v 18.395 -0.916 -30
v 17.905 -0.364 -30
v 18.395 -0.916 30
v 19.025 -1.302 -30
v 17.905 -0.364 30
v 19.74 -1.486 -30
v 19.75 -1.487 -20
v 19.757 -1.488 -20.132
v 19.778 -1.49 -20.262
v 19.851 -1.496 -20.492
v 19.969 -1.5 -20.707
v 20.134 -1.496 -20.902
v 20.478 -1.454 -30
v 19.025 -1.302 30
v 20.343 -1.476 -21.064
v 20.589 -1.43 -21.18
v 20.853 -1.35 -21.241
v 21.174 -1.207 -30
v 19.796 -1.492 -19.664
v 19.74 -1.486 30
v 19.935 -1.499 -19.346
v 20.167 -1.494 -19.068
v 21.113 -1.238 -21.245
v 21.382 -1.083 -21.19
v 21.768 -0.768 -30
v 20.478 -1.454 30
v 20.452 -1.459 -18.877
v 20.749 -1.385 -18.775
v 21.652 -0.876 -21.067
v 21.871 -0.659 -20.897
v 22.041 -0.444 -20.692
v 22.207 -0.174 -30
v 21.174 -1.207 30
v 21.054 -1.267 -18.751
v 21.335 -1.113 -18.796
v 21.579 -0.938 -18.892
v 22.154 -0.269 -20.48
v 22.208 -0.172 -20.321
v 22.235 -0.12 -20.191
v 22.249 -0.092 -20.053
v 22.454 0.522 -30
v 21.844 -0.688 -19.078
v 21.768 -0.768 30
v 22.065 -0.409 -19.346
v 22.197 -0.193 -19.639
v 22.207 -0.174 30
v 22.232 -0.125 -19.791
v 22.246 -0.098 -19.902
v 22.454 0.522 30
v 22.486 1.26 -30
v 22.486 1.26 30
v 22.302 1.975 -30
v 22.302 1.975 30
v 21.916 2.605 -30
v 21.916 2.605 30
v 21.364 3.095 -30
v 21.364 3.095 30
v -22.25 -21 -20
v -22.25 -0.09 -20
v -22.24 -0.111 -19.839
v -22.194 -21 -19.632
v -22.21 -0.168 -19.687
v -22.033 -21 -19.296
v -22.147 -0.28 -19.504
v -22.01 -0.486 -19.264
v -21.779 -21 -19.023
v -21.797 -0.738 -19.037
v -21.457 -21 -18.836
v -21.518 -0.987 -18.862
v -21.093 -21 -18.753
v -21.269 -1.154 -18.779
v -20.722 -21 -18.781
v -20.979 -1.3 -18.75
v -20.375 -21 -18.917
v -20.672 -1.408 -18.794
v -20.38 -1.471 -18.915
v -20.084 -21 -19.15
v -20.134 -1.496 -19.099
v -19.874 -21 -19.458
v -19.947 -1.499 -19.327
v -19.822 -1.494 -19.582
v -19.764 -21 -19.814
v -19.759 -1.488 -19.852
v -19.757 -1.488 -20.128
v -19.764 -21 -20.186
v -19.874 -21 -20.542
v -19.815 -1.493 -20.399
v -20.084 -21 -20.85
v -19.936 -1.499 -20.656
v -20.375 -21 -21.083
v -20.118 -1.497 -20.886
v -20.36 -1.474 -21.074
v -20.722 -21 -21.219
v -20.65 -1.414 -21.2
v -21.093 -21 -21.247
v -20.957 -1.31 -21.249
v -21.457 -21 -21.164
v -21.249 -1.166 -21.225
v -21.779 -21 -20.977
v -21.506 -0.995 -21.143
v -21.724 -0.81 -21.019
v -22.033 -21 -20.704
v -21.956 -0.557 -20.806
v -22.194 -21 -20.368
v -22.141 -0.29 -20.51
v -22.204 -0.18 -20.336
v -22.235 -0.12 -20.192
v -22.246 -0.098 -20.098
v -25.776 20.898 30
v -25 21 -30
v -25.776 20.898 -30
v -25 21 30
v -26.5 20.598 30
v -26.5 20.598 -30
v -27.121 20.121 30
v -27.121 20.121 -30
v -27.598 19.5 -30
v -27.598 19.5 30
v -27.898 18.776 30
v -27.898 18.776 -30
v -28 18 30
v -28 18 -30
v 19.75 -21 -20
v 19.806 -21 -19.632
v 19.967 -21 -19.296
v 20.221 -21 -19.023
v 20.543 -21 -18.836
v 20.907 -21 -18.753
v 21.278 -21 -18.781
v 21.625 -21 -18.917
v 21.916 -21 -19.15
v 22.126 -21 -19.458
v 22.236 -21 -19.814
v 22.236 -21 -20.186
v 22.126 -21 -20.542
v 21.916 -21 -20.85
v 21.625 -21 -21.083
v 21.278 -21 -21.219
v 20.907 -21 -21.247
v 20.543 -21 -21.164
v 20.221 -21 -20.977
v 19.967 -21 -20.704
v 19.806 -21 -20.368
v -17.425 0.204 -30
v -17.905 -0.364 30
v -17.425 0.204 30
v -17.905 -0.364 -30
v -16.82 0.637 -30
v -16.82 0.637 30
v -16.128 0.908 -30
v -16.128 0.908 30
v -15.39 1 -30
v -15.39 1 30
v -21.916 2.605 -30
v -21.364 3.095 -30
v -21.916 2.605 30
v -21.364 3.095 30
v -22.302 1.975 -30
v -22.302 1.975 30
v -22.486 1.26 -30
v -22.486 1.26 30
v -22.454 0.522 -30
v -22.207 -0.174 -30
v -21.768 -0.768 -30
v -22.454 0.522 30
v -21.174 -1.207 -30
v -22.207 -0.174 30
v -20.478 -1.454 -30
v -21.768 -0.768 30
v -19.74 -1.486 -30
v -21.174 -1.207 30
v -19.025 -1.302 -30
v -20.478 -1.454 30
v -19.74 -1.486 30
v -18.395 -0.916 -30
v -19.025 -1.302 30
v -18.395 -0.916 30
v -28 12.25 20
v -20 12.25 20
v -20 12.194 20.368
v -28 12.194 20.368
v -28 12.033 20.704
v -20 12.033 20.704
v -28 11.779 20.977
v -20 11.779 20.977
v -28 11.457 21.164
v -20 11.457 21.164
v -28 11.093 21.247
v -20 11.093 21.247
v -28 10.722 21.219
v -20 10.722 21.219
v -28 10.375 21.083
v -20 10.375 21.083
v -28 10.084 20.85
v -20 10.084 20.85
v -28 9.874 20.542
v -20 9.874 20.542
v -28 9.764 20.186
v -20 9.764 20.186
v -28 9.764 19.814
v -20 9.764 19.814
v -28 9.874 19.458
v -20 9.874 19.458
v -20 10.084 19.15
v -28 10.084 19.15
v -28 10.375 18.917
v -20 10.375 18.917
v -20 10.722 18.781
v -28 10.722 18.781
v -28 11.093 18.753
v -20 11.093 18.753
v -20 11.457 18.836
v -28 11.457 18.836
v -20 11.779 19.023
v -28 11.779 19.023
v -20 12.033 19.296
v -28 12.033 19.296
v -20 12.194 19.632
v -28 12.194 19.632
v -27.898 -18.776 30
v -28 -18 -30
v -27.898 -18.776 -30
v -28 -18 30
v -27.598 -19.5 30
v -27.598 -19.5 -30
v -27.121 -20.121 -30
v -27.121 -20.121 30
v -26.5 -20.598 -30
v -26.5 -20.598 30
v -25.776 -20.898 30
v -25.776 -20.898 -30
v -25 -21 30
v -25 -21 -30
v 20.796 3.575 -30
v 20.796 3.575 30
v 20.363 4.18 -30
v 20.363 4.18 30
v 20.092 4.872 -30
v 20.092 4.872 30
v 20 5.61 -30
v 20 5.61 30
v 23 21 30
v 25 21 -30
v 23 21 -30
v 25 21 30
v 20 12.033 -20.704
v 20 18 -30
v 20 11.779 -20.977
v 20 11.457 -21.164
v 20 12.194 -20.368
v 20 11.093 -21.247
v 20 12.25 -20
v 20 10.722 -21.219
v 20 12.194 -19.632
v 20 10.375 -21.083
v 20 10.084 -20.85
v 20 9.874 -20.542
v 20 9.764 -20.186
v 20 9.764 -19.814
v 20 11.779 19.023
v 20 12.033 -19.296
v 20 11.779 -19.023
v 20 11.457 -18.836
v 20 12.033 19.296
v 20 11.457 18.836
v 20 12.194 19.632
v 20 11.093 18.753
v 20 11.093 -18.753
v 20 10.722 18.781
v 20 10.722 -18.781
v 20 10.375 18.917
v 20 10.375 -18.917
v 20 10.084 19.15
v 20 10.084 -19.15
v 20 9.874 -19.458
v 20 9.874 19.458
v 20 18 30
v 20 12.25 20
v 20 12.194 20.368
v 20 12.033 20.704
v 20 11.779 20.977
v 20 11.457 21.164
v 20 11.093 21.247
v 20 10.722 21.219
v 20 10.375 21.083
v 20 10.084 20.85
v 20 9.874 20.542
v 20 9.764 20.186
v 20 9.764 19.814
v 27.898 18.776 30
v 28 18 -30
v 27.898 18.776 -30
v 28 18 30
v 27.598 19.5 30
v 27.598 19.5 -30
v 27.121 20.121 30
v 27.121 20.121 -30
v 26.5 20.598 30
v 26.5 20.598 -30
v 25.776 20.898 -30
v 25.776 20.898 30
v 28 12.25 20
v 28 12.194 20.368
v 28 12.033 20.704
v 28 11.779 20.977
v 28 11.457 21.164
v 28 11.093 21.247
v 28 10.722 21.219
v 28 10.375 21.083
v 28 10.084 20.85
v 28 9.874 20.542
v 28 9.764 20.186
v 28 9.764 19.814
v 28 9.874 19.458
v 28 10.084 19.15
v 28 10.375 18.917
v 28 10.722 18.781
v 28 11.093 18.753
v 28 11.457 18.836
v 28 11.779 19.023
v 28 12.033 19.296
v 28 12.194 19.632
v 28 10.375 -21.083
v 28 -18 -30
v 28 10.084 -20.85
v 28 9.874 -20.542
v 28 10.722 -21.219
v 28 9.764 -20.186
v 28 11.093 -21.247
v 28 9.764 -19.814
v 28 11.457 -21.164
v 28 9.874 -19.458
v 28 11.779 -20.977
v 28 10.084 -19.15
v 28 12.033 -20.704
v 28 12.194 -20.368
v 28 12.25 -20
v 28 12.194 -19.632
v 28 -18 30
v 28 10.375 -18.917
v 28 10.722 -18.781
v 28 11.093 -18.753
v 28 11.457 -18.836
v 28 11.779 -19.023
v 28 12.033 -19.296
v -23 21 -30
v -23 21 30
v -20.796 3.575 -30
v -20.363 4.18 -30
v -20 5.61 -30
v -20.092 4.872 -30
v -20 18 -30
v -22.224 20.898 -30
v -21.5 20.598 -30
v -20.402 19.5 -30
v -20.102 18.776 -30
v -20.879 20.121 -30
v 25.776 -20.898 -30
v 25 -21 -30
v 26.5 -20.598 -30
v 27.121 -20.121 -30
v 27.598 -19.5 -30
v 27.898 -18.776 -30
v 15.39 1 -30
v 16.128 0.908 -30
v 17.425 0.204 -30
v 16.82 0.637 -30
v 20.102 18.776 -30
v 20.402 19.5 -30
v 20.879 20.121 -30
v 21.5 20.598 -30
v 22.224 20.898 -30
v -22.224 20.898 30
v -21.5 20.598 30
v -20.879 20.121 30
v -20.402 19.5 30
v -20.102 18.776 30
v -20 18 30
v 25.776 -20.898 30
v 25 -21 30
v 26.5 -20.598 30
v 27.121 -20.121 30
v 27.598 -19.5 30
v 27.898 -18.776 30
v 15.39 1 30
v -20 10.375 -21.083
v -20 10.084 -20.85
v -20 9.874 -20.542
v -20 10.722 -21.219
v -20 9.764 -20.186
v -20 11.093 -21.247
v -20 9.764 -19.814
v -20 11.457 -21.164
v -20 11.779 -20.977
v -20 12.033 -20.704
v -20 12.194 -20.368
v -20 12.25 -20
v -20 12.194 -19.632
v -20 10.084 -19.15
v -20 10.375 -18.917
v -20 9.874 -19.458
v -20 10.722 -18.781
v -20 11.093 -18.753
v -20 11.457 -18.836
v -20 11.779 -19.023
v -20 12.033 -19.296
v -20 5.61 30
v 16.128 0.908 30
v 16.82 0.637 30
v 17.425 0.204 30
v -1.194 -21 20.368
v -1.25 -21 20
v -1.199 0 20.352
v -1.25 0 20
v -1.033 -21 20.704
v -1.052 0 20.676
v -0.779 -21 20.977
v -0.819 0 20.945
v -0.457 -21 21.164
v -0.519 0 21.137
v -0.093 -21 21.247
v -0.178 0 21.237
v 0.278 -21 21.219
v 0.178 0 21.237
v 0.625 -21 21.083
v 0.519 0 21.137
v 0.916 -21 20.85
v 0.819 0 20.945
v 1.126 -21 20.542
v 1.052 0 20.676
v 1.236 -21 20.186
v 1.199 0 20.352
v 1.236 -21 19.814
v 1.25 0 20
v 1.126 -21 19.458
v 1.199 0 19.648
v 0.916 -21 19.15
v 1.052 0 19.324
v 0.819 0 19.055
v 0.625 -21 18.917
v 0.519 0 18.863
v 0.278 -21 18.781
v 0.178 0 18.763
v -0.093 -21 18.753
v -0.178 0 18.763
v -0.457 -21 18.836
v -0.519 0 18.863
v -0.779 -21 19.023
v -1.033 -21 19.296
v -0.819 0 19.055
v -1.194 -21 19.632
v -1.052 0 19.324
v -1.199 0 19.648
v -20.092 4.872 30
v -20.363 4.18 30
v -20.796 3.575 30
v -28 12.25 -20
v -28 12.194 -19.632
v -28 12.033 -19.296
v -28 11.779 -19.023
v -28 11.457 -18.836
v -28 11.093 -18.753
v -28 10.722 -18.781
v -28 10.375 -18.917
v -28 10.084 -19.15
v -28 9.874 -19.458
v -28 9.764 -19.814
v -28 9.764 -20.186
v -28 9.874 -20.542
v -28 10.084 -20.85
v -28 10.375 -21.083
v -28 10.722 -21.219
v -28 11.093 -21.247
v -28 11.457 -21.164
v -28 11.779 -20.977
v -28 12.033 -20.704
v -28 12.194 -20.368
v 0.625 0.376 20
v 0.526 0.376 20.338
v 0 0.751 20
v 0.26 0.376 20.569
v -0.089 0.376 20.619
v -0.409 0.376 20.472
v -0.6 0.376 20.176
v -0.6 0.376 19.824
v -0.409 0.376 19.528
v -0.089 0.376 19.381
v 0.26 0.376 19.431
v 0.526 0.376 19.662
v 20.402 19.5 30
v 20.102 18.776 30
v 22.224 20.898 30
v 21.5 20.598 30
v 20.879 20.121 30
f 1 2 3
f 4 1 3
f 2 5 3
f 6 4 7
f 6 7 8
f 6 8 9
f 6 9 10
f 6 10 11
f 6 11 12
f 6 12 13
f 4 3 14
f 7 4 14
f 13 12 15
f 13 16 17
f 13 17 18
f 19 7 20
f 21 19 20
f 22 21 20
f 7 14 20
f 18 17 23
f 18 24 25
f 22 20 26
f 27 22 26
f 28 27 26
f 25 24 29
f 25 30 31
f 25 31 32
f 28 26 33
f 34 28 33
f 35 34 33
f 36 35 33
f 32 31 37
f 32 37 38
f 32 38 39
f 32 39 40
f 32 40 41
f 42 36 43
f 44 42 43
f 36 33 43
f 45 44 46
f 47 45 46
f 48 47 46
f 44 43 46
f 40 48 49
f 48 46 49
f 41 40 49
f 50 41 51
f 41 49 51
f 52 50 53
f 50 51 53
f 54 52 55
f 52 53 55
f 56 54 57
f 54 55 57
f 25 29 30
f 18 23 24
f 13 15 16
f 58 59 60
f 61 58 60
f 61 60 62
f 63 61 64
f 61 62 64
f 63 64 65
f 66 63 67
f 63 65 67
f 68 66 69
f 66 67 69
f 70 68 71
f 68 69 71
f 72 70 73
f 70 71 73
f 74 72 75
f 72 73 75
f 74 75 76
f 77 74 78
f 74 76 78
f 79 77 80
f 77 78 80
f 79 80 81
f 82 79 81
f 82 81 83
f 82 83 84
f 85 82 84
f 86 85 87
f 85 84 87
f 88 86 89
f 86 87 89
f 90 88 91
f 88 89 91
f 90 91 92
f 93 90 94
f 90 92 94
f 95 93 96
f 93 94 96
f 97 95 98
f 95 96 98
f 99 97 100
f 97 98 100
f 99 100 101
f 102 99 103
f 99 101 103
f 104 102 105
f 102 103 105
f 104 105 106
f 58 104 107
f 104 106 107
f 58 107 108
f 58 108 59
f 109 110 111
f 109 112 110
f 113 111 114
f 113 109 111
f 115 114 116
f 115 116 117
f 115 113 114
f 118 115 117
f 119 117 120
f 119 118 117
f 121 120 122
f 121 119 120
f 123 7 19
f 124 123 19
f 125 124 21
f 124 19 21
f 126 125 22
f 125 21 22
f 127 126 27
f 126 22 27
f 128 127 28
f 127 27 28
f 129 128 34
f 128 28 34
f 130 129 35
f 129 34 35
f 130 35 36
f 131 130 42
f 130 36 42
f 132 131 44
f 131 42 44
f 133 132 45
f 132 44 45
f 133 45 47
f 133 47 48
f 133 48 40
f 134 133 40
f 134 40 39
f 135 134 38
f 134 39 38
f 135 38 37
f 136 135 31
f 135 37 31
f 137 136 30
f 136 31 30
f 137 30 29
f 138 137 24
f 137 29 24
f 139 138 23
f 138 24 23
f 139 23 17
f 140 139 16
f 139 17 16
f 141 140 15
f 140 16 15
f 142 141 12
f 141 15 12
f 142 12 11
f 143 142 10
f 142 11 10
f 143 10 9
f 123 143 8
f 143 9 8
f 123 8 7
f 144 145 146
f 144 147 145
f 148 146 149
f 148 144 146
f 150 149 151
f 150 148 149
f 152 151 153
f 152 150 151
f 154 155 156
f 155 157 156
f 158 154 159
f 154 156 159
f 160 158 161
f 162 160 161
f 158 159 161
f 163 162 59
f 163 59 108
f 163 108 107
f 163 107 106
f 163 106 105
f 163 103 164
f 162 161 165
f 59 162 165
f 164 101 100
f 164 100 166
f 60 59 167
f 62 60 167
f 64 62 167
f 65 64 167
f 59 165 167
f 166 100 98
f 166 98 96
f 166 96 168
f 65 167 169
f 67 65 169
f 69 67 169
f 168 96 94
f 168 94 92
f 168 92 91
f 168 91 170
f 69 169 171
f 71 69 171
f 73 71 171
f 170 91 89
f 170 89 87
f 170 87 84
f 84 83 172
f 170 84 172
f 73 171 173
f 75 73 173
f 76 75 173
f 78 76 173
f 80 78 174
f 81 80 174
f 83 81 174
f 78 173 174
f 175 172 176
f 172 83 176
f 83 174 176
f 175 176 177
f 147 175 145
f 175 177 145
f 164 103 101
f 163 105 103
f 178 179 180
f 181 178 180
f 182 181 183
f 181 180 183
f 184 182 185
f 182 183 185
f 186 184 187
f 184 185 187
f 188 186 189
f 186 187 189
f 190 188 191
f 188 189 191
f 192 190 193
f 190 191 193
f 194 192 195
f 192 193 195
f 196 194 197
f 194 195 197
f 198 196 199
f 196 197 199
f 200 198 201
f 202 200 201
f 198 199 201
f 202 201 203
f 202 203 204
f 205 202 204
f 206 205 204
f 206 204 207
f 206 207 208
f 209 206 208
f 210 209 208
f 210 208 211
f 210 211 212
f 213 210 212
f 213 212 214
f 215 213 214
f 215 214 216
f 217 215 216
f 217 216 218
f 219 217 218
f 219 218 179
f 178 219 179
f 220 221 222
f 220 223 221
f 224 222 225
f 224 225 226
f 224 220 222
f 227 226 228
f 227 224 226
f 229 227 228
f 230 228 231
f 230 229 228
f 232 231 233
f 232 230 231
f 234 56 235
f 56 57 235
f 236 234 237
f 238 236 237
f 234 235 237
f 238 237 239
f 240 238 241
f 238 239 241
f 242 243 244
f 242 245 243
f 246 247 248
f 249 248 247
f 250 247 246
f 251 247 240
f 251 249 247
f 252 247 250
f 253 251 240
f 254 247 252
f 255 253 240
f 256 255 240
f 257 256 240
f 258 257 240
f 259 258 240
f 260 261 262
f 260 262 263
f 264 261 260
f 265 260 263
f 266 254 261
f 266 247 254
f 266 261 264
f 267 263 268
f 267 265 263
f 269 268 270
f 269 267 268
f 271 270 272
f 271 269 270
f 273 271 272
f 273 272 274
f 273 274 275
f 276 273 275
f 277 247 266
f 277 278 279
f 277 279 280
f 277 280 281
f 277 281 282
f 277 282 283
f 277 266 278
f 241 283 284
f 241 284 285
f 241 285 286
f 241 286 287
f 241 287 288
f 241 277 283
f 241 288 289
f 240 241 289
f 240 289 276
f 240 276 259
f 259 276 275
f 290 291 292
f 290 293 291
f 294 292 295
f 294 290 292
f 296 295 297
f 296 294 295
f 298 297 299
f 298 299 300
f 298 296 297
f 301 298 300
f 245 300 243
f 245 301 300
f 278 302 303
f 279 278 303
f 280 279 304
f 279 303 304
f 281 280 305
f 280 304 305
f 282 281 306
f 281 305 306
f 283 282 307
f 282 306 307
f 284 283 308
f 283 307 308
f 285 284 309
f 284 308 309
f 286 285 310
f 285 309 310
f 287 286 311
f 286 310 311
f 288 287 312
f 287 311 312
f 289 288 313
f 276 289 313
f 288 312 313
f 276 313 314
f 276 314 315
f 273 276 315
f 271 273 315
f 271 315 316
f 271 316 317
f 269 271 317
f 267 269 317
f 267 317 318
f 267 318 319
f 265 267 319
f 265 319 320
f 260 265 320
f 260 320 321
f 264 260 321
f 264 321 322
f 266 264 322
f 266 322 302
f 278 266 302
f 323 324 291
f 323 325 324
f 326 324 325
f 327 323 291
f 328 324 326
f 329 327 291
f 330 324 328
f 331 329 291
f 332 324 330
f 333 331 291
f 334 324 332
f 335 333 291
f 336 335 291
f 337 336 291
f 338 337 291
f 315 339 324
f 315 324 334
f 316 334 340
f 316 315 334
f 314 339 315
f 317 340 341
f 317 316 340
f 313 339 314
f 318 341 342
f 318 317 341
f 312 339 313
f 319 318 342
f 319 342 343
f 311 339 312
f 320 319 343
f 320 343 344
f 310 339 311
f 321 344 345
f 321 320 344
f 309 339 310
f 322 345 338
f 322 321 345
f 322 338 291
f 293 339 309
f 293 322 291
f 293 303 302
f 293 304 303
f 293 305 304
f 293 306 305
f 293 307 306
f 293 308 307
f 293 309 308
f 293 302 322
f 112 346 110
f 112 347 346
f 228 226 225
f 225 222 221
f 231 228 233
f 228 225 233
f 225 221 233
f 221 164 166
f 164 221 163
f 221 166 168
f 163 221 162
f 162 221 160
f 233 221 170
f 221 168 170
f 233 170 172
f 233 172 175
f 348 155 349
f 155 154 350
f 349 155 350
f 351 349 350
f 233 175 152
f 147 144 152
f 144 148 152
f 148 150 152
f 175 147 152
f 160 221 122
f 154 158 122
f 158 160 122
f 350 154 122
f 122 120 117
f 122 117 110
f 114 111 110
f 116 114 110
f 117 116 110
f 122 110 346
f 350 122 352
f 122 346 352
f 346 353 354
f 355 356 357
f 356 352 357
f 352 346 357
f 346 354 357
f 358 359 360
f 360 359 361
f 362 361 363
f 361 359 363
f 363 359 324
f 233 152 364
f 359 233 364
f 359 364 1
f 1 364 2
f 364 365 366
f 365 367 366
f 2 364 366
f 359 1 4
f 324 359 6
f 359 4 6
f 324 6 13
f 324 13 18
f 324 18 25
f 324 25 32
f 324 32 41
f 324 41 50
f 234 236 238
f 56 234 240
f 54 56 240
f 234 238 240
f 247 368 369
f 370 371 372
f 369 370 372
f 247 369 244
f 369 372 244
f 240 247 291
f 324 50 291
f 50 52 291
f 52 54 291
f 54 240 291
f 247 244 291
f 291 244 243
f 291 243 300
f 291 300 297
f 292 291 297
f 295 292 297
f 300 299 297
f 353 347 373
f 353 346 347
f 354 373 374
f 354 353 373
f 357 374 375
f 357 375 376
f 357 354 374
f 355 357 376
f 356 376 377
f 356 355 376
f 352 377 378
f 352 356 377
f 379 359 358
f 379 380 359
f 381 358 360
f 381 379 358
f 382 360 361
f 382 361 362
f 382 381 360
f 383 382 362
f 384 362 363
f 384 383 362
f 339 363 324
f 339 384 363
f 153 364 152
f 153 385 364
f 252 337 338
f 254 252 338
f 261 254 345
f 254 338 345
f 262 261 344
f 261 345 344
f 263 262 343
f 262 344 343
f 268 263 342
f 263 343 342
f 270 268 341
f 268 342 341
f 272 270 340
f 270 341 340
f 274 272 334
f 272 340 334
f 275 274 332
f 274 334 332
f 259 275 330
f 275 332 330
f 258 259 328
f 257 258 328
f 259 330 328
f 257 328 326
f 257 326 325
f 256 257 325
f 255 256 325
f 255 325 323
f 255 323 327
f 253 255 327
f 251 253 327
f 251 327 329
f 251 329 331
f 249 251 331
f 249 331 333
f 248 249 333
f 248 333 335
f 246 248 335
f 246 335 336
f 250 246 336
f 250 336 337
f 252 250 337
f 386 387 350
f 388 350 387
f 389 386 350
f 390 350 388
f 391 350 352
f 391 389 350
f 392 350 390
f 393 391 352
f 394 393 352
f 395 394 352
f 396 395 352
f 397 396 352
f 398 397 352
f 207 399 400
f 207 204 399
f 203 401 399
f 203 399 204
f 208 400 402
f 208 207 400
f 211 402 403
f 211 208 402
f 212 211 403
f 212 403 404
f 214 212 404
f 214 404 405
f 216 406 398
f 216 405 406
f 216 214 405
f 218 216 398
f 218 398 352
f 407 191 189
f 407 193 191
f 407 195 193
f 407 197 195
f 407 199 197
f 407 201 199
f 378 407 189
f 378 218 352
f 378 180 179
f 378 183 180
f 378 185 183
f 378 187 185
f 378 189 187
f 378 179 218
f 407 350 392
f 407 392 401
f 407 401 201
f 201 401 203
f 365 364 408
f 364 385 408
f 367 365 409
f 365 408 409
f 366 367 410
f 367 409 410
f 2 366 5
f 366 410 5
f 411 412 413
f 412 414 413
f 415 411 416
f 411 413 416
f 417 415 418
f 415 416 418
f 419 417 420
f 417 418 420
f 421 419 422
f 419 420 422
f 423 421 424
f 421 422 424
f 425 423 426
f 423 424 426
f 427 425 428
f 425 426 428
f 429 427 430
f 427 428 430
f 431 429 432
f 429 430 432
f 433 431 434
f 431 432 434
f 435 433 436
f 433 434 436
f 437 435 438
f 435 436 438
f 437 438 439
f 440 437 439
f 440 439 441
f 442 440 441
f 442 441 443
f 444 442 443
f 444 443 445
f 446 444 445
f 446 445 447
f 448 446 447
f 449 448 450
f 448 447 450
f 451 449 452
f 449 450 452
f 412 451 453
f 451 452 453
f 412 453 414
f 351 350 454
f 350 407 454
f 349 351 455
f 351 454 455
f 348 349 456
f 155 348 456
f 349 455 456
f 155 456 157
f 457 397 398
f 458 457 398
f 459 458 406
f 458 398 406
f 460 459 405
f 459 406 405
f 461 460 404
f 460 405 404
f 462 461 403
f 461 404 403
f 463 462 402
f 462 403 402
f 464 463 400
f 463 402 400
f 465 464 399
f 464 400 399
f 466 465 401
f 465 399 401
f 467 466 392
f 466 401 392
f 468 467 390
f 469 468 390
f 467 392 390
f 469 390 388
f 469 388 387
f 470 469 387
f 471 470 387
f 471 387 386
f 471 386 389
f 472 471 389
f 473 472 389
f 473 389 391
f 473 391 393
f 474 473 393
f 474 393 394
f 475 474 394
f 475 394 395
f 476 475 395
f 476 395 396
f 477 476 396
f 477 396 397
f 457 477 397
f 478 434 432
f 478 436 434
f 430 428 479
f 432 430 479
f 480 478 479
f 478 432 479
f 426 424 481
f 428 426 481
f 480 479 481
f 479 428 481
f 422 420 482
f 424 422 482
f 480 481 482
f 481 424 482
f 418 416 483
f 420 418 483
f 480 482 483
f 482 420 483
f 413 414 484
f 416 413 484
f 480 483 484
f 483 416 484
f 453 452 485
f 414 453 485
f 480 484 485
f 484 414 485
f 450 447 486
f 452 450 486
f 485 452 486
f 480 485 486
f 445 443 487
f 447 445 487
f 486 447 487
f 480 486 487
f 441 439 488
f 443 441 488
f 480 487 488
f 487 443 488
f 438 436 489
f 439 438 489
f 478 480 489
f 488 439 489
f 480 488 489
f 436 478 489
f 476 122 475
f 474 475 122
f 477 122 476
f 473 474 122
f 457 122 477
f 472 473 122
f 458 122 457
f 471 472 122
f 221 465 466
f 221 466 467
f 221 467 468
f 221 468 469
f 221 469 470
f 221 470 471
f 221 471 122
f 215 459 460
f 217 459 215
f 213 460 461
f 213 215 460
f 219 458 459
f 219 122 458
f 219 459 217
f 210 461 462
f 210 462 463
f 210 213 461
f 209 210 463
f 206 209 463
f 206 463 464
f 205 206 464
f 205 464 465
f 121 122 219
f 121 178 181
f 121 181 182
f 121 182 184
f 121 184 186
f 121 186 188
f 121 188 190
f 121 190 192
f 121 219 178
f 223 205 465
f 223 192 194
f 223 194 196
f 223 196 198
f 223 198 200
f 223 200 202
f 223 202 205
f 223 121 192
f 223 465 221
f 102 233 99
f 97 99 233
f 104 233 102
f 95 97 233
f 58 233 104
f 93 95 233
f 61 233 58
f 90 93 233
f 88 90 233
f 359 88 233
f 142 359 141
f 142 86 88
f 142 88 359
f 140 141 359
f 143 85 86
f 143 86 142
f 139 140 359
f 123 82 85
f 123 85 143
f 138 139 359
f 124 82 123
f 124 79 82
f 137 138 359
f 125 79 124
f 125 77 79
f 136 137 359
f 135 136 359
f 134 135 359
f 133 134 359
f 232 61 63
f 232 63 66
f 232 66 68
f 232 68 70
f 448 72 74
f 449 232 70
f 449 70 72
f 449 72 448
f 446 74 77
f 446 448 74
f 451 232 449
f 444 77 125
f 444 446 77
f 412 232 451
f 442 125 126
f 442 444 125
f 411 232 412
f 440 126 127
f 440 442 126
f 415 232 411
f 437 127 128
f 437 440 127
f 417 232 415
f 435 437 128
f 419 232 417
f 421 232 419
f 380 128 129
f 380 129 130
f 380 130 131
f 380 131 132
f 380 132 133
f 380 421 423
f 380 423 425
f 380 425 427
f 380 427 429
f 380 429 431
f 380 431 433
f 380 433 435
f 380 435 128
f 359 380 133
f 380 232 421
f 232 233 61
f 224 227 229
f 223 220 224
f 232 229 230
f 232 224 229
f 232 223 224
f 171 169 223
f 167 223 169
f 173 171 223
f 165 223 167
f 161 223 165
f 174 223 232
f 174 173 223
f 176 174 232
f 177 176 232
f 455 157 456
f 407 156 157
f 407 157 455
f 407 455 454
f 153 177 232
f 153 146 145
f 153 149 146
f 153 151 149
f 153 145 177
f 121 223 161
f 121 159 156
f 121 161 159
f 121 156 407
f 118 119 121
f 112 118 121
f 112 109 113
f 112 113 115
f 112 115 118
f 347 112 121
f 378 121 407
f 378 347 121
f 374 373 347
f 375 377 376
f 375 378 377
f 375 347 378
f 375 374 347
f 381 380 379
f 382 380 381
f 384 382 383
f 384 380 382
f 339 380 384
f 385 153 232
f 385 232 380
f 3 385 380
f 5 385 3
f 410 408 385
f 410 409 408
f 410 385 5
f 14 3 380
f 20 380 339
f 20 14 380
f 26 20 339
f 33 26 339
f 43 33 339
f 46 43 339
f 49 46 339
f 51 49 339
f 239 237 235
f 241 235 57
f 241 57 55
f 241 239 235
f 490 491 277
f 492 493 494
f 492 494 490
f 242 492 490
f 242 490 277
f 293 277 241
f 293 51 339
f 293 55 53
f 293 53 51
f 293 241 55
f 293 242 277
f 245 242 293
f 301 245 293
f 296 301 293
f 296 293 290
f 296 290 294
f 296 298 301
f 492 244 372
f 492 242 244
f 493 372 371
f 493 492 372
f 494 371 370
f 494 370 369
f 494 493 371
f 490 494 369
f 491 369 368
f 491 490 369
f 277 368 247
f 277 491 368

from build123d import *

# Parameters (mm, degrees)
F1_DEPTH = 30
F3_D     = 2.5
F5_D     = 2.5
F5_DEPTH = 21
F5_TIP   = 0.7510757738
F6_R     = 3
F7_R     = 2.5
F8_DEPTH = 60.001
F9_R     = 3


with BuildPart() as f1:
    # F0 (on Top) → F1 (new body, symmetric)
    with BuildSketch(Plane.XY):
        Polygon((-20, 21), (-28, 21), (-28, -21), (28, -21), (28, 21), (20, 21), (20, 1), (-20, 1), align=None)
    extrude(amount=F1_DEPTH, both=True)

    # F3 (through all)
    with Locations(Plane(origin=(-28, 0, 0), x_dir=(0, -1, 0), z_dir=(-1, 0, 0))):
        with Locations((-11, 20), (-11, -20)):
            Hole(F3_D / 2)

    # F5
    with Locations(Plane.XZ.offset(21)):
        with Locations((0, 20), (-21, -20), (21, -20)):
            Hole(F5_D / 2, depth=F5_DEPTH)
            with Locations((0, 0, -(F5_DEPTH + F5_TIP / 2))):  # 118° drill point
                Cone(0, F5_D / 2, F5_TIP, mode=Mode.SUBTRACT)

    # F6
    f6_edges = [f1.edges().sort_by_distance(p)[0] for p in [
        (-28, -21, 0),
        (28, -21, 0),
        (-28, 21, 0),
        (-20, 21, 0),
        (20, 21, 0),
        (28, 21, 0),
    ]]
    fillet(f6_edges, radius=F6_R)

    # F7 (on face) → F8 (cut, through all)
    with BuildSketch(Plane.XY.offset(30)):
        with Locations((-20, 1)):
            Circle(F7_R)
        with Locations((20, 1)):
            Circle(F7_R)
    extrude(amount=-F8_DEPTH, mode=Mode.SUBTRACT)

    # F9
    f9_edges = [f1.edges().sort_by_distance(p)[0] for p in [
        (-17.5, 1, 0),
        (-20, 3.5, 0),
        (17.5, 1, 0),
        (20, 3.5, 0),
    ]]
    fillet(f9_edges, radius=F9_R)


solid = f1.part
